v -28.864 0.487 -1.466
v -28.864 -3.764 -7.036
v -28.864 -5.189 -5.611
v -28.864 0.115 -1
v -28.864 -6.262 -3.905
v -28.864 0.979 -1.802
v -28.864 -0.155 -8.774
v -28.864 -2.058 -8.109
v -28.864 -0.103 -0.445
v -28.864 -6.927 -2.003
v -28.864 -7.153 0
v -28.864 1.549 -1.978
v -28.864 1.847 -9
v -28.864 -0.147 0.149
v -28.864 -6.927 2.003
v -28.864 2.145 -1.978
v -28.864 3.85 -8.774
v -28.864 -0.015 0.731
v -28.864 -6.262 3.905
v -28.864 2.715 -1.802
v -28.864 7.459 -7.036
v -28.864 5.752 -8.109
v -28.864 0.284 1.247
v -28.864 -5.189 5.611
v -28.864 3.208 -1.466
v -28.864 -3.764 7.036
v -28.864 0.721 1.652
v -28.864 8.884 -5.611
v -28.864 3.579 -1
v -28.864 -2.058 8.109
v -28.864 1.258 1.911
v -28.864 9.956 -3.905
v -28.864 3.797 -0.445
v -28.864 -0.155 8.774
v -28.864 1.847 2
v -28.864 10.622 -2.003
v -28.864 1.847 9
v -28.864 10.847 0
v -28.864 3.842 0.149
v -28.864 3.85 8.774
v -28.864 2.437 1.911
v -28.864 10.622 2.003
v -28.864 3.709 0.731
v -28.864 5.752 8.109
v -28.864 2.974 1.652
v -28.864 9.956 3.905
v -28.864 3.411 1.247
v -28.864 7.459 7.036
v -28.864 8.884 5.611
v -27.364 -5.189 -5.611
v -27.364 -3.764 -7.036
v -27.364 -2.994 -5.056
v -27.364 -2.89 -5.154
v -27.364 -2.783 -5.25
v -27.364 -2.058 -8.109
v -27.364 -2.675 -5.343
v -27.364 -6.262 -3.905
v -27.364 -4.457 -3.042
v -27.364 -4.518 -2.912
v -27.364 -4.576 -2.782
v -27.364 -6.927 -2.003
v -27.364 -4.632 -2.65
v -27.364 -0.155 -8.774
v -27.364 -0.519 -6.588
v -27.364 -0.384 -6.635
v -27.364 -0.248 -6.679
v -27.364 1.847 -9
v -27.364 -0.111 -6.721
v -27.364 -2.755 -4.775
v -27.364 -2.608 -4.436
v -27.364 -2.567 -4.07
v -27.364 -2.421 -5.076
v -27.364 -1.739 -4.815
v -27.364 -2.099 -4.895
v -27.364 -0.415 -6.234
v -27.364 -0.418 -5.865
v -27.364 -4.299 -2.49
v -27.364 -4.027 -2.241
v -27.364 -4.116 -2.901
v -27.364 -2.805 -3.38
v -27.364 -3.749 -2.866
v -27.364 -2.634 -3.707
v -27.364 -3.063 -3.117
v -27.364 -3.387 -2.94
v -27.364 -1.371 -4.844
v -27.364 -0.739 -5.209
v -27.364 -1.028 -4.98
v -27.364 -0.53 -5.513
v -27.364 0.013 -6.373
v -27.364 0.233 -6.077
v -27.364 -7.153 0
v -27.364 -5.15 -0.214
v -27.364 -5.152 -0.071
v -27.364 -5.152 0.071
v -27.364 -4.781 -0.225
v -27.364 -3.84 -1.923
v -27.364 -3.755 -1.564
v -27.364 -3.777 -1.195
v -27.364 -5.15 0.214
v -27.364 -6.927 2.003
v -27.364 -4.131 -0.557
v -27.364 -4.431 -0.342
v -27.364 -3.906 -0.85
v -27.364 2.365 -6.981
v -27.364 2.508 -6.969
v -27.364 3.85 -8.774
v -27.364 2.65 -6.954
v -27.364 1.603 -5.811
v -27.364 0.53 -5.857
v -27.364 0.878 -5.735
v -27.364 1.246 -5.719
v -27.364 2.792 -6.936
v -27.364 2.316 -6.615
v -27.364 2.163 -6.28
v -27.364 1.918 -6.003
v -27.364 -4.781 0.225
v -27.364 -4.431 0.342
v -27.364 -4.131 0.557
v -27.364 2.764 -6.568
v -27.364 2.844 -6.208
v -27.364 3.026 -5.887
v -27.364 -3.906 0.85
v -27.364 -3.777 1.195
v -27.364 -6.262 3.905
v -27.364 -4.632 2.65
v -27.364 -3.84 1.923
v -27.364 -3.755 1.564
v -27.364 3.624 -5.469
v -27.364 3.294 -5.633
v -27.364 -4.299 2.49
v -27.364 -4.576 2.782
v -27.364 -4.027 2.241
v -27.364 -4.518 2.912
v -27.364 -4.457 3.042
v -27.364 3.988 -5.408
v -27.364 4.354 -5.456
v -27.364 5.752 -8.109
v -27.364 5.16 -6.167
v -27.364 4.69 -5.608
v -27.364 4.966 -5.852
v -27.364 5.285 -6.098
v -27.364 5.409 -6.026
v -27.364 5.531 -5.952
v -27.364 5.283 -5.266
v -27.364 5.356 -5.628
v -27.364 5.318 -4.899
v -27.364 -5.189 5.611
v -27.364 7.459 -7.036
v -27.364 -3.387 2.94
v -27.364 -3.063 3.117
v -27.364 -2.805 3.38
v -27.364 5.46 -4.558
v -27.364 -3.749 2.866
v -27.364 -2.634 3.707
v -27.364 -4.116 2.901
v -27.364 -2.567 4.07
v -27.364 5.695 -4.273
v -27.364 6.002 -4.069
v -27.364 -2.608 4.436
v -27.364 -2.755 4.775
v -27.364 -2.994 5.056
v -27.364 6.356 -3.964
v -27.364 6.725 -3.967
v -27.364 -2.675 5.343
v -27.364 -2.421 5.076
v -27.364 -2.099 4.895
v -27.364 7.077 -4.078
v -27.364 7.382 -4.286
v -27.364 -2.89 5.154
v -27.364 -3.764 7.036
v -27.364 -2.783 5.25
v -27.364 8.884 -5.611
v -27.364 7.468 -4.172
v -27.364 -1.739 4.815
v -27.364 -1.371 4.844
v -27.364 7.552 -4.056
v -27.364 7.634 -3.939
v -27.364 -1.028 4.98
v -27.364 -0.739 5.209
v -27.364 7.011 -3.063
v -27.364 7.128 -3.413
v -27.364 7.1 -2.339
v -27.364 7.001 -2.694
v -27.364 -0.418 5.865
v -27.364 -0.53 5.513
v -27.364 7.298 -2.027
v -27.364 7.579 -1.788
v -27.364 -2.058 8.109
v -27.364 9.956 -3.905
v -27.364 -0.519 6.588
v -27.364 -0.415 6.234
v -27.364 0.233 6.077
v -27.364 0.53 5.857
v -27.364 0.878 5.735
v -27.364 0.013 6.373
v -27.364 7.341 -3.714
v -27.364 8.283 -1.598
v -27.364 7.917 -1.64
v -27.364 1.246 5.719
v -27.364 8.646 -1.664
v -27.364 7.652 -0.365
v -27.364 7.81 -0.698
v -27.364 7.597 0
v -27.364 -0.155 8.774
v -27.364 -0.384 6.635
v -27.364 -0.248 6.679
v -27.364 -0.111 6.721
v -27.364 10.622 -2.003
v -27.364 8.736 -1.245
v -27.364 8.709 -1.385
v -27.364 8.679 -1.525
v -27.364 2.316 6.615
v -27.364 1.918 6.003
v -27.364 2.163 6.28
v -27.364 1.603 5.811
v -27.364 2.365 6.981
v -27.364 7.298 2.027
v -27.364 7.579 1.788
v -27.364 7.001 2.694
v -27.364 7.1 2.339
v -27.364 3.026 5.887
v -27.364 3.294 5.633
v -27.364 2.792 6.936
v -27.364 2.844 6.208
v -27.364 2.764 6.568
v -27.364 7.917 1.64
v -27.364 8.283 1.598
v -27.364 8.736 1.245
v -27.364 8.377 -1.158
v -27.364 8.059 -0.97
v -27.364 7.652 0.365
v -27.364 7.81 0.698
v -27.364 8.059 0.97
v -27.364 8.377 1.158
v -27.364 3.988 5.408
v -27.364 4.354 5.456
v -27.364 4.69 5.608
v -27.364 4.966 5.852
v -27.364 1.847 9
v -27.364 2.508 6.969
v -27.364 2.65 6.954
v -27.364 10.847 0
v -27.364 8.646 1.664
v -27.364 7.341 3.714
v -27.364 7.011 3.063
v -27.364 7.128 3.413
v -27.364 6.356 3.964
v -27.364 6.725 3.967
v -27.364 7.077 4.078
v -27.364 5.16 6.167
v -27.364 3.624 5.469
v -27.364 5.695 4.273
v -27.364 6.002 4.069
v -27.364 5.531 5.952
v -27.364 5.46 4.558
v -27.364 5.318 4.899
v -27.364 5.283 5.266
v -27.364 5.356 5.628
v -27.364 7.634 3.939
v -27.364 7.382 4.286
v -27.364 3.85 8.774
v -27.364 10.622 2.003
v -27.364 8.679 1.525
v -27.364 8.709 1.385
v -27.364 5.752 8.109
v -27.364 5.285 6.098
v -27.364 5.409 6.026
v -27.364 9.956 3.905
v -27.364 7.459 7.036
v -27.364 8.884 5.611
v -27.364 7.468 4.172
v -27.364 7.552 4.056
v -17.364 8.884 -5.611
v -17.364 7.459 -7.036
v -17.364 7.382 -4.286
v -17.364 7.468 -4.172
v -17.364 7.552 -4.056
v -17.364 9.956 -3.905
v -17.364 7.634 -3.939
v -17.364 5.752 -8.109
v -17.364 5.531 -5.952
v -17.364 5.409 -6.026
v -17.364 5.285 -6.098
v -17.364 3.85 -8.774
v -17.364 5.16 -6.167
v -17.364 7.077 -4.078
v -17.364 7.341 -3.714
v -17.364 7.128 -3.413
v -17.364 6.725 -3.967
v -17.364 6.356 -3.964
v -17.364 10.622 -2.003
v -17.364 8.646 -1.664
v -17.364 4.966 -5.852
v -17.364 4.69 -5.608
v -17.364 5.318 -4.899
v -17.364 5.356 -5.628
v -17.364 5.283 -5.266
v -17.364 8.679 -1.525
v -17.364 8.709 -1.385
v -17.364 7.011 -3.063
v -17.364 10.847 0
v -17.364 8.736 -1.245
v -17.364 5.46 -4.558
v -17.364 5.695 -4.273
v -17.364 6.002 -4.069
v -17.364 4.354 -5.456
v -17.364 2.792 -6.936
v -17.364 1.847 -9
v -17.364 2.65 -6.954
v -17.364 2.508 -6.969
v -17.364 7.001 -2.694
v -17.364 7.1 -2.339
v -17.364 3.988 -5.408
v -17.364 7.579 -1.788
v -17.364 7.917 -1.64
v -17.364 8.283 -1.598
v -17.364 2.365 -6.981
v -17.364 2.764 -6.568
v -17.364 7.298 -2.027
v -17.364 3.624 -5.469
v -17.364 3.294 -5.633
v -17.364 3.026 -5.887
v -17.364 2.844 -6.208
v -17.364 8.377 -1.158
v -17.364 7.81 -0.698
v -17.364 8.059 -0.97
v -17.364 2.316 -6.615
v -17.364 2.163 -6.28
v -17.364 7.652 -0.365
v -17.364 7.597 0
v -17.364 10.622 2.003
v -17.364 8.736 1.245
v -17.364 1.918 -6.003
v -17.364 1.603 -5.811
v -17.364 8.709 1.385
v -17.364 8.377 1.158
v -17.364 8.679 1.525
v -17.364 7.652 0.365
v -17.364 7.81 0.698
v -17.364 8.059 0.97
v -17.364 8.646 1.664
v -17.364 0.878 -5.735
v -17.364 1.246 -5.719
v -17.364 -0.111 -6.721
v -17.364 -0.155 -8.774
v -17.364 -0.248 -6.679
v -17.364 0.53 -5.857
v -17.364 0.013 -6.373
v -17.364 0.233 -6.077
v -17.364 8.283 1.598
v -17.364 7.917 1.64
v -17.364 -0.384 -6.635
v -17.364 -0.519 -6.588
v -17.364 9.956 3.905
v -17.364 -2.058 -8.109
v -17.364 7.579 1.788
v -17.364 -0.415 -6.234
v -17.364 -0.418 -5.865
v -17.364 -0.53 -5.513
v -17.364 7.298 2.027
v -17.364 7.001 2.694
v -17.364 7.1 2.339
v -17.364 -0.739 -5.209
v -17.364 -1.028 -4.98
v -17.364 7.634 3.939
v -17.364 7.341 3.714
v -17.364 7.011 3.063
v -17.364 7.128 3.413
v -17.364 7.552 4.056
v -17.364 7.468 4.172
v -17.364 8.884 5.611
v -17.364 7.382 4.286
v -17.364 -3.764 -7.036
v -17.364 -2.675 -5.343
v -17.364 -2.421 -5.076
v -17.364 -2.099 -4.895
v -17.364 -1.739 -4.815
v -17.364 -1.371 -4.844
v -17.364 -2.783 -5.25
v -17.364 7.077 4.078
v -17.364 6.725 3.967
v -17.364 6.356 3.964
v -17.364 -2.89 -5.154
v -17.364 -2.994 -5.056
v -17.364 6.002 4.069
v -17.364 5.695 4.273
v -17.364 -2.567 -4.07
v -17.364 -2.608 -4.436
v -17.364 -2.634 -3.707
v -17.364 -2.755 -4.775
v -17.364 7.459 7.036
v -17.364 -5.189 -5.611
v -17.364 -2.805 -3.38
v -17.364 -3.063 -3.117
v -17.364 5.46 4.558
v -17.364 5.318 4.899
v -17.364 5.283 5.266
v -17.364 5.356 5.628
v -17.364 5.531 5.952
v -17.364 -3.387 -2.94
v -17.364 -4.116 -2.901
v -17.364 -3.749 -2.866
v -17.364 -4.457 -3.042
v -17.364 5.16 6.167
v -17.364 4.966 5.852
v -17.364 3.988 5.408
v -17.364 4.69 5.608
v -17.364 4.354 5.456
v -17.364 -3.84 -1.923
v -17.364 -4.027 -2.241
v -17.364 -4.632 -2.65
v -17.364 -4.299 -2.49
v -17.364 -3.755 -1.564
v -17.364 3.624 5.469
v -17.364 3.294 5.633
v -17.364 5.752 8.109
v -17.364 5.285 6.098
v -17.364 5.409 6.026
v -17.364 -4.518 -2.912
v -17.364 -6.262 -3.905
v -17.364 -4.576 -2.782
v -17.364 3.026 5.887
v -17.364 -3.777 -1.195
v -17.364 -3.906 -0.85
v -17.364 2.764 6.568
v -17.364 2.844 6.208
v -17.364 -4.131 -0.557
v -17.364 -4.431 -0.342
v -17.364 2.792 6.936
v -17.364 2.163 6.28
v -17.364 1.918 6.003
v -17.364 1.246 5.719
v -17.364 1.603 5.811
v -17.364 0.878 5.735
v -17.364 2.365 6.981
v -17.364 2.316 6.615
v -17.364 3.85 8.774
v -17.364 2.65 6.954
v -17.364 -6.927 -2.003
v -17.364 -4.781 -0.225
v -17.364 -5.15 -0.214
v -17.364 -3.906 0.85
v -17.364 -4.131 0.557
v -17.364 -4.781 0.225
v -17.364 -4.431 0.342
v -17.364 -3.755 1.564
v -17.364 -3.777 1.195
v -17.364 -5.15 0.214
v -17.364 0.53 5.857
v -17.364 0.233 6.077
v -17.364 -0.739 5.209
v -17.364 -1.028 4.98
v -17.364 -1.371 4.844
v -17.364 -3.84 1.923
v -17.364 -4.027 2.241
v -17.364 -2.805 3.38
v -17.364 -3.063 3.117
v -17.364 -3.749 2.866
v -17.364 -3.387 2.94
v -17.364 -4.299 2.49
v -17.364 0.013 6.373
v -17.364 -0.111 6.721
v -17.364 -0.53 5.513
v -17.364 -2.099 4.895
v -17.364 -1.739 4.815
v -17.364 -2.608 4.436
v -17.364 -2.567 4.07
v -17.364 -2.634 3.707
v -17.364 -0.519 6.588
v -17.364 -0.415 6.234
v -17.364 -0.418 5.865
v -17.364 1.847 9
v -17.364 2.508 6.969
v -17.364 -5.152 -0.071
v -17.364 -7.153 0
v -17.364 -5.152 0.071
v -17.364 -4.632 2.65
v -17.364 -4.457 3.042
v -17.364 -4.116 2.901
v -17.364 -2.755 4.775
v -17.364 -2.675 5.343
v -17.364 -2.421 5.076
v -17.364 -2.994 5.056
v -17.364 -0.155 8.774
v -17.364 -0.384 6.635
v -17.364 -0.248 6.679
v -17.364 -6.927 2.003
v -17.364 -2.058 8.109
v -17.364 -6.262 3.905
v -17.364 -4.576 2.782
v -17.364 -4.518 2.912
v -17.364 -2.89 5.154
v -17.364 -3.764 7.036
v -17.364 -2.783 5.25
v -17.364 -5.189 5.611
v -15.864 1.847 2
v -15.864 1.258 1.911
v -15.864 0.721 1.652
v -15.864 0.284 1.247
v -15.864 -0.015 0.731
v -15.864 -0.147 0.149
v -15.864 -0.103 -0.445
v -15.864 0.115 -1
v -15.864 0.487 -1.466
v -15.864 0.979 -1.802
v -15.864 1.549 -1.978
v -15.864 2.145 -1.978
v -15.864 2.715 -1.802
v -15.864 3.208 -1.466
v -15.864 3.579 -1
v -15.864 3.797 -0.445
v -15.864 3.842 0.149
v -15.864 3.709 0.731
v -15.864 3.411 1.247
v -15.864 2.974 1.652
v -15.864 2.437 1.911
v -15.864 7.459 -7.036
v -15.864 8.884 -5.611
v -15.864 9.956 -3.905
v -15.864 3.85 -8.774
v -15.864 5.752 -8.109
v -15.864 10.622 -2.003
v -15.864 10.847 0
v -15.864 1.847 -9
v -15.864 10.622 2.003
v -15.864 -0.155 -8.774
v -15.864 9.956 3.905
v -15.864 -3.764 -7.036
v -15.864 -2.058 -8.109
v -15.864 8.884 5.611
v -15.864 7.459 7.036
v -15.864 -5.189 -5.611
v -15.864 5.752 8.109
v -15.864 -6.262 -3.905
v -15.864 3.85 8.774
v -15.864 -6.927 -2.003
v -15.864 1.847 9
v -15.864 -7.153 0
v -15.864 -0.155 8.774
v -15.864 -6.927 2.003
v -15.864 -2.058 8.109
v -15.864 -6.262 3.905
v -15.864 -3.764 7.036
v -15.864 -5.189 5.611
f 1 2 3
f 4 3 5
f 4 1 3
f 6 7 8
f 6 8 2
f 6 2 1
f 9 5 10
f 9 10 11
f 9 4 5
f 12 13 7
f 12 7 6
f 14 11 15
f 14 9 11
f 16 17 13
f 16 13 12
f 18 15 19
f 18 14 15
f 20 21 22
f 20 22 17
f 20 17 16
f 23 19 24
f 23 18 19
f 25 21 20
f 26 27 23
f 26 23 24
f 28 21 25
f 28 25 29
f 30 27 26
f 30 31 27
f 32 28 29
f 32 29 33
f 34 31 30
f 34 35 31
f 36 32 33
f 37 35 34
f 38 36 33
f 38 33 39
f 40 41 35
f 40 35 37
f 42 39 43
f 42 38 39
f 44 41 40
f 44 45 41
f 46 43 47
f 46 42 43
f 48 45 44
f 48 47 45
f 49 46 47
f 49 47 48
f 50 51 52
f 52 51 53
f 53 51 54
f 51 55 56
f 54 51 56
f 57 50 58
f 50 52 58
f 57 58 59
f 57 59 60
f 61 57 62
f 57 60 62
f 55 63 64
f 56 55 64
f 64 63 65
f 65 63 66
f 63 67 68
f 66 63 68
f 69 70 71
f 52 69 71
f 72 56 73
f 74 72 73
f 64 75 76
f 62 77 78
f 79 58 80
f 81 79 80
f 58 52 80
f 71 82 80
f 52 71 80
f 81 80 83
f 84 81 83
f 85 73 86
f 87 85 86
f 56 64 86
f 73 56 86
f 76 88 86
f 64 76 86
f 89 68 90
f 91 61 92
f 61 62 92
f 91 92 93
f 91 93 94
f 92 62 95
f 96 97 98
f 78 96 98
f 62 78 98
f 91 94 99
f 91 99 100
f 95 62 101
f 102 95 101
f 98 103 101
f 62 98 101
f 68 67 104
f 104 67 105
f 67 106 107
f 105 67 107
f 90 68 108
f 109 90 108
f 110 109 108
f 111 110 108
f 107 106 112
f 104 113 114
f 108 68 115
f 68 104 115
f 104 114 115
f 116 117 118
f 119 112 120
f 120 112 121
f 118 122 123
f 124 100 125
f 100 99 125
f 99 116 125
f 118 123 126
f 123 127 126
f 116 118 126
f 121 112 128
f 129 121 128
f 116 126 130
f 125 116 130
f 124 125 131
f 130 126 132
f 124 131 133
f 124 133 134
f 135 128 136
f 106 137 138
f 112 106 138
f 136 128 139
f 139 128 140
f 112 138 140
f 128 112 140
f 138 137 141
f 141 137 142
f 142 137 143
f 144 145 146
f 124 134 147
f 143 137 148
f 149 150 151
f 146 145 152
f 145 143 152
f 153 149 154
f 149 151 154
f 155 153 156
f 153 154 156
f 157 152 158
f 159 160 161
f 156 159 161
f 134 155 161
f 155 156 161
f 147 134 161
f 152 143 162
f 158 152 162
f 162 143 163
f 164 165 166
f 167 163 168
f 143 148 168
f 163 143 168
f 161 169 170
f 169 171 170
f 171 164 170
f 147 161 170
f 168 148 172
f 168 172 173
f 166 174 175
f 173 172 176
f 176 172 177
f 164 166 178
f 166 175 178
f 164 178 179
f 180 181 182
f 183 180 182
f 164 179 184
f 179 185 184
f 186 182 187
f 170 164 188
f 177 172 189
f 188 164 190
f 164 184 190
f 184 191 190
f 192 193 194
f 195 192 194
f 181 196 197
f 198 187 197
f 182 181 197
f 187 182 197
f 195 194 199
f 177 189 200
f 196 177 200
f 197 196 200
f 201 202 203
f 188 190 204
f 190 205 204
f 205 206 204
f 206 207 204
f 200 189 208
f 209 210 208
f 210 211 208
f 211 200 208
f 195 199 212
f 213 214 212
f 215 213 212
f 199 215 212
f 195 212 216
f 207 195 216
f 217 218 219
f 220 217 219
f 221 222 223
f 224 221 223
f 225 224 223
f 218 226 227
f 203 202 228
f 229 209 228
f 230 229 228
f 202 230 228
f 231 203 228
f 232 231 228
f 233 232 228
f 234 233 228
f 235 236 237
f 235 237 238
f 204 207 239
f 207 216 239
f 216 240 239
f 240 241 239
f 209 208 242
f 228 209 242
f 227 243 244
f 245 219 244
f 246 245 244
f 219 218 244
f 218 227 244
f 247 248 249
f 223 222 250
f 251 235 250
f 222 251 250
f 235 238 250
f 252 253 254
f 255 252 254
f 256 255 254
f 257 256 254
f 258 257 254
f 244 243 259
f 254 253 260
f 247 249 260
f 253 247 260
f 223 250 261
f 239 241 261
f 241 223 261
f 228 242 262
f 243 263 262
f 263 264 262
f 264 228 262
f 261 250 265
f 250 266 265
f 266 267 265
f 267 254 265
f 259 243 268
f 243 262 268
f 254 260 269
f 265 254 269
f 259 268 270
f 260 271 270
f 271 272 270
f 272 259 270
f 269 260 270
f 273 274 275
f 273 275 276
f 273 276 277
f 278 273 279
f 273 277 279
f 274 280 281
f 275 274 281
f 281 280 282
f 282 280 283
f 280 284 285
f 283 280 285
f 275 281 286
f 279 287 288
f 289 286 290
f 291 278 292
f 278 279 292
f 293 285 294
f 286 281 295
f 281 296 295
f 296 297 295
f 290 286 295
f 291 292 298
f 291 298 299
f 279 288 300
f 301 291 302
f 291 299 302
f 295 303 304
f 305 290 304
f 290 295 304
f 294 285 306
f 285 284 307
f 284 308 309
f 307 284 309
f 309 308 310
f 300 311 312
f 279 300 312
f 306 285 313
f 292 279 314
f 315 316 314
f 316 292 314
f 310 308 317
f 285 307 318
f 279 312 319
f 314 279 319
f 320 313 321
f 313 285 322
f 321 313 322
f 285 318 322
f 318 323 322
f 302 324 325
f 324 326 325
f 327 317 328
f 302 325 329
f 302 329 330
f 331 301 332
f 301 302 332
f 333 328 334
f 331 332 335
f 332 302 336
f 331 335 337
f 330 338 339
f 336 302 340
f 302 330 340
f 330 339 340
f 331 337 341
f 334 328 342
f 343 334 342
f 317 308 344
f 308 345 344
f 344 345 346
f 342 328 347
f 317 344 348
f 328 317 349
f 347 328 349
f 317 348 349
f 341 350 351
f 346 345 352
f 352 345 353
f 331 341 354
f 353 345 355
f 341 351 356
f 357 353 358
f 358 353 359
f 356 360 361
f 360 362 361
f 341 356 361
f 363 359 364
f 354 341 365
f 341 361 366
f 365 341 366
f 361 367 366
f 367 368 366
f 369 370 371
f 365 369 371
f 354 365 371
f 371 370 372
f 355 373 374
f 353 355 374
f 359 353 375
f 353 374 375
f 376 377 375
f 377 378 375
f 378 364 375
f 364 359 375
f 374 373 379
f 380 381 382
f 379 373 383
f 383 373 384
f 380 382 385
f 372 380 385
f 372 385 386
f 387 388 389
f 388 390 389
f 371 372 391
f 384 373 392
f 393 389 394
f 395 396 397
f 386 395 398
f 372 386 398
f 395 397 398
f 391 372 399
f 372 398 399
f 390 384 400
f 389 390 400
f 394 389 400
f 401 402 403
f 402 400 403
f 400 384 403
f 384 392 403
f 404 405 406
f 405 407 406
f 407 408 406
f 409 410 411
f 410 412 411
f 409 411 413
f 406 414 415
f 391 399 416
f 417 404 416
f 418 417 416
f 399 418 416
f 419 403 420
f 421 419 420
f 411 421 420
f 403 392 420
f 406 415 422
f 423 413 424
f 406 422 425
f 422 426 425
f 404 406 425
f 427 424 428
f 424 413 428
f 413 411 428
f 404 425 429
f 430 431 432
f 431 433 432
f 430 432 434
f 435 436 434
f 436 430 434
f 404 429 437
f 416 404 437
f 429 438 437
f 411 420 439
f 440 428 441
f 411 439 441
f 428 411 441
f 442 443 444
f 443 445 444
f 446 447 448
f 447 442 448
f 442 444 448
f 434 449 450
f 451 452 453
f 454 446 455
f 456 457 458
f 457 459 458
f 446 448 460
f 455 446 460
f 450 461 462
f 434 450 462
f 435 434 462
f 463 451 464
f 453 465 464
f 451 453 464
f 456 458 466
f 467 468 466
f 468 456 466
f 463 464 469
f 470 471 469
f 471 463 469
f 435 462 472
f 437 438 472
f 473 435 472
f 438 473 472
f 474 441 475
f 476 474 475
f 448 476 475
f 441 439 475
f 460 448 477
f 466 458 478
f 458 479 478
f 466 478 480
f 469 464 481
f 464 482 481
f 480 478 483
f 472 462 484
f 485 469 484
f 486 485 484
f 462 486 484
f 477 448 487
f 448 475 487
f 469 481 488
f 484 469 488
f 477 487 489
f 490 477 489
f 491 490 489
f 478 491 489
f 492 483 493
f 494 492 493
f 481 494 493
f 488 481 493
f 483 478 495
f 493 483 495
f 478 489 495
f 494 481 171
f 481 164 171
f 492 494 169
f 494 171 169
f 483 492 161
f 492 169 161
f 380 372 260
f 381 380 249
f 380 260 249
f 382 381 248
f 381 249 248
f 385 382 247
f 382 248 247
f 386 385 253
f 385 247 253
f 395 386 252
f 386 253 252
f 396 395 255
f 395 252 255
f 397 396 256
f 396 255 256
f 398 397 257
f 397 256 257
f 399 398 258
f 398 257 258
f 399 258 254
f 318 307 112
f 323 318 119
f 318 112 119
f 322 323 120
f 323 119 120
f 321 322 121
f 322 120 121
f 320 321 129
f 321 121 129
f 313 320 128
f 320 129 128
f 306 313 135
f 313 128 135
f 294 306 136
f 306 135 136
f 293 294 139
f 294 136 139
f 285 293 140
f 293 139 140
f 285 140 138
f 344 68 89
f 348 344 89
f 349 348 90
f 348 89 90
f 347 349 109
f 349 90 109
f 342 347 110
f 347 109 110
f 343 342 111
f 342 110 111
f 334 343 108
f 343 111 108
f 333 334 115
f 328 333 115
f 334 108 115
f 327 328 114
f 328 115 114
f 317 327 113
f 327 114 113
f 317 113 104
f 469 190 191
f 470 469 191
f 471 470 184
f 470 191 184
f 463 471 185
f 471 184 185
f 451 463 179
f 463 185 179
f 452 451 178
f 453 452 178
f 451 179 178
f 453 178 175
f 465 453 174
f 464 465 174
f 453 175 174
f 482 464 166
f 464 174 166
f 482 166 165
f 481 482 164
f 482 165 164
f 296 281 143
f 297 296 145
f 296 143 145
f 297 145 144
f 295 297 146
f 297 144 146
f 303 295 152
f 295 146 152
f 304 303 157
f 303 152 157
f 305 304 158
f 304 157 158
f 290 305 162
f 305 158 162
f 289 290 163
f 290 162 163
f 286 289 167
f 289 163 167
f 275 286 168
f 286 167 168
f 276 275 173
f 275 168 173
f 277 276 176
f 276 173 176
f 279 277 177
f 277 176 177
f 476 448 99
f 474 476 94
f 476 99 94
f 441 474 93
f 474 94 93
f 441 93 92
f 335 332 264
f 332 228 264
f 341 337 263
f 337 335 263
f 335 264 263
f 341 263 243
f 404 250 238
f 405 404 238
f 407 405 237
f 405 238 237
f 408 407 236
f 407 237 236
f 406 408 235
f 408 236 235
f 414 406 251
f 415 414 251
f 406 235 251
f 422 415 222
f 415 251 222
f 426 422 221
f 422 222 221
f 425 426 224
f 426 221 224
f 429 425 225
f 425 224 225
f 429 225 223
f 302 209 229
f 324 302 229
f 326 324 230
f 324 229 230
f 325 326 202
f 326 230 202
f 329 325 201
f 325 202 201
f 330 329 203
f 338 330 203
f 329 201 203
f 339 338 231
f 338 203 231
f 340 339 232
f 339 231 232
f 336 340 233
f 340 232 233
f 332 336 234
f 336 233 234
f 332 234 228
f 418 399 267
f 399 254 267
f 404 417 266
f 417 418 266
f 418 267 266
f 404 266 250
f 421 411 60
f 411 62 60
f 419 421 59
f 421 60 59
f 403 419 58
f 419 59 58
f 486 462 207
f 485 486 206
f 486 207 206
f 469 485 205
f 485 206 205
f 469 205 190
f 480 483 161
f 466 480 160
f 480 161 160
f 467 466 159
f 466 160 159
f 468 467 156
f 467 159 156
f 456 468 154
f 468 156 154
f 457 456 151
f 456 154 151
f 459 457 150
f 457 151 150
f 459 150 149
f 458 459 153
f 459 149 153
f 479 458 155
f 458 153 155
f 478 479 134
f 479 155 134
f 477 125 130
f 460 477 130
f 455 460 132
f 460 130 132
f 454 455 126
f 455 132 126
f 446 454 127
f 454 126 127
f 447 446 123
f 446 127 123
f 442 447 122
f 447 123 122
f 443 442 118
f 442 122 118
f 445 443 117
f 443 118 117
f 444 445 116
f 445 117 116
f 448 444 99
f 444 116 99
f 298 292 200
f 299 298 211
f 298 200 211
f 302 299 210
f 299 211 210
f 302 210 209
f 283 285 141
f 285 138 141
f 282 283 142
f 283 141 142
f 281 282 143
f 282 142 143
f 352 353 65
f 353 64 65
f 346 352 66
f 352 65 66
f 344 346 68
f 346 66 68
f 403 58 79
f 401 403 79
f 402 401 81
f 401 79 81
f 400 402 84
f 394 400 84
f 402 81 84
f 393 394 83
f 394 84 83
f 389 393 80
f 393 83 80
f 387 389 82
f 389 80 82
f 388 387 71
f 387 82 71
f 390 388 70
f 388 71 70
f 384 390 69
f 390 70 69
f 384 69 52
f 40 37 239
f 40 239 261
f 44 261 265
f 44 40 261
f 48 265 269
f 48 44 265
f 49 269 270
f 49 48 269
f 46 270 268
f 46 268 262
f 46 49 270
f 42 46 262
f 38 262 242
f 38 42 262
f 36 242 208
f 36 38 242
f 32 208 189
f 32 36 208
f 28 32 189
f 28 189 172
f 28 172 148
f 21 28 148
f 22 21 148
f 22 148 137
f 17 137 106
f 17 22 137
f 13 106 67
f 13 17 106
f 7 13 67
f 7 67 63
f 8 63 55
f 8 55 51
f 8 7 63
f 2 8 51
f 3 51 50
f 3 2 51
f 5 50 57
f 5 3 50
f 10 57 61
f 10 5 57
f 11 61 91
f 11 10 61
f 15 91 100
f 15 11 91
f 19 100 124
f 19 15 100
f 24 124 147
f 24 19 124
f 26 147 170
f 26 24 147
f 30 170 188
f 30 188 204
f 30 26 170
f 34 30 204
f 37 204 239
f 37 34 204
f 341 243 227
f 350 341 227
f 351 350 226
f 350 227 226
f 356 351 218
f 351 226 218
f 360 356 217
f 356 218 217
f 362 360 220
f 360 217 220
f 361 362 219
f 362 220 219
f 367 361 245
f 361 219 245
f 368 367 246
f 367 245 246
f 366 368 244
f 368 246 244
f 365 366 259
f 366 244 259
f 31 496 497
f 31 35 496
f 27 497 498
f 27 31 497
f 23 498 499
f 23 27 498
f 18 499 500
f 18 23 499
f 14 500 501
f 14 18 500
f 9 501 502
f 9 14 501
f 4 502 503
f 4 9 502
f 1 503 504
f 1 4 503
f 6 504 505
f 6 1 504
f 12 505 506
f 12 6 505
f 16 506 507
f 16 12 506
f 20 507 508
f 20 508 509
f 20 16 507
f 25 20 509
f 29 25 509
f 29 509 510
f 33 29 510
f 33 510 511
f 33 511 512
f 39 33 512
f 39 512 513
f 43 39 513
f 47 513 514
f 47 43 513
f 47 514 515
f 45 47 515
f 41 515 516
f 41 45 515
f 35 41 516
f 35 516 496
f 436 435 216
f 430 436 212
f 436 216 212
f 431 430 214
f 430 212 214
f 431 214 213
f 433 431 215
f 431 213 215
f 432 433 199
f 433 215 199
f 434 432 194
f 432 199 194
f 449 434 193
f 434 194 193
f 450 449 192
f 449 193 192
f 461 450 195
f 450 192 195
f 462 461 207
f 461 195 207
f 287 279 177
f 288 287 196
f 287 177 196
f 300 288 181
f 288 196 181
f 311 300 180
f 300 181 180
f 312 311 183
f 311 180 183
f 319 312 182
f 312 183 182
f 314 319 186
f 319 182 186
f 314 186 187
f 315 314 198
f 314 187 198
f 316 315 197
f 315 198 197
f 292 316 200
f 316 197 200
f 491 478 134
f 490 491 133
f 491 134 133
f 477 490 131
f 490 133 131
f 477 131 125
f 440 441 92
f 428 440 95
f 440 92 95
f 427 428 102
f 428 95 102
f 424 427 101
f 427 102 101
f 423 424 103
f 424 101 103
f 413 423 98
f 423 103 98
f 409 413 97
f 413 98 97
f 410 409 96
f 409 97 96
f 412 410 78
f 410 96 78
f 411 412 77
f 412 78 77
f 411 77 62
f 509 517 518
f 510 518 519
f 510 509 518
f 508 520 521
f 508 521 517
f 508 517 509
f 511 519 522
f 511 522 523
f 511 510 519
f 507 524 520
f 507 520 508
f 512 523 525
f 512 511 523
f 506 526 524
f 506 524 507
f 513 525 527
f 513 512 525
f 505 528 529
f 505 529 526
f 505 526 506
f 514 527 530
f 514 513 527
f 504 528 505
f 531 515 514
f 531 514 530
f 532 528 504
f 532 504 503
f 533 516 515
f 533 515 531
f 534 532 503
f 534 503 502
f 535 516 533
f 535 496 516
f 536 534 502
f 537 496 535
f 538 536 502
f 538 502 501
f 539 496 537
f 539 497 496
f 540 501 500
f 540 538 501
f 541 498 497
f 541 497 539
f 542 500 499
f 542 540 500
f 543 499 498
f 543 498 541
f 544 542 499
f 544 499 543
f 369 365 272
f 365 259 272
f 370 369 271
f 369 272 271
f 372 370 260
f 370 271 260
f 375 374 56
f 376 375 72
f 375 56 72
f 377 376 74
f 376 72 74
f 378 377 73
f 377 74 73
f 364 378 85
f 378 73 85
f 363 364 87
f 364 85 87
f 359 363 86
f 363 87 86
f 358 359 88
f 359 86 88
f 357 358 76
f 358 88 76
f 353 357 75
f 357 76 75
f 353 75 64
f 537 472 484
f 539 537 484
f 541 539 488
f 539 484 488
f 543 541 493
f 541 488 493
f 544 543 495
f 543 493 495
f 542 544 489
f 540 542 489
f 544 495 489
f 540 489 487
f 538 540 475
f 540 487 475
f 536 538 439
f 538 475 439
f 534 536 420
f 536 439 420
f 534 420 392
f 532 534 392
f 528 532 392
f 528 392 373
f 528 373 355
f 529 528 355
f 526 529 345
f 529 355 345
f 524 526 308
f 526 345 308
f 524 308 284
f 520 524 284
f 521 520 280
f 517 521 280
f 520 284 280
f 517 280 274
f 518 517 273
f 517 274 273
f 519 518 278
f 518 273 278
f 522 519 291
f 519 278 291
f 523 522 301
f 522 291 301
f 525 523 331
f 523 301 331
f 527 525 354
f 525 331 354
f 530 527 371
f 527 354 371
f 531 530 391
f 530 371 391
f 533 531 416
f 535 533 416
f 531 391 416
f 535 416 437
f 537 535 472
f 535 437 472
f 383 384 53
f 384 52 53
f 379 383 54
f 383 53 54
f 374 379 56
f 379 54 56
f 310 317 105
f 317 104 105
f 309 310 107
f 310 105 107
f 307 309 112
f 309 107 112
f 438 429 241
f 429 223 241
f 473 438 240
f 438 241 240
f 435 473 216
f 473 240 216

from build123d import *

# Parameters (mm, degrees)
SKETCH_3_R               = 2
CUT_EXTRUDE_2_DEPTH      = 17
SKETCH_4_W               = 2.5
SKETCH_4_H               = 2.683329606
CUT_EXTRUDE_3_DEPTH      = 17
PATTERN_CIRCULAR_1_COUNT = 15
EXTRUDE_START            = 1.5
SKETCH_5_R               = 9
SKETCH_5_R_2             = 2
EXTRUDE_1_DEPTH          = 1.5
SKETCH_6_R               = 9
SKETCH_6_R_2             = 2
EXTRUDE_2_DEPTH          = 1.5


with BuildPart() as part:
    # 草图1 → 旋转2 (revolve)
    with BuildSketch(Plane.XY, mode=Mode.PRIVATE) as revolve_2_sk:
        Polygon((-27.363734917, 8.847191366), (-27.363734917, 3.847191366), (-28.613734917, 3.847191366), (-28.613734917, 1.847191366), (-16.113734917, 1.847191366), (-16.113734917, 3.847191366), (-17.363734917, 3.847191366), (-17.363734917, 8.847191366), align=None)
    revolve(revolve_2_sk.sketch.rotate(Axis((-48.964491856, 1.847191366, 0), (1, 0, 0)), 90), axis=Axis((-48.964491856, 1.847191366, 0), (1, 0, 0)))

    # 草图3 → 切除-拉伸2 (cut)
    with BuildSketch(Plane.ZY.offset(28.613734917)):
        with Locations((0, 1.847191366)):
            Circle(SKETCH_3_R)
    extrude(amount=-CUT_EXTRUDE_2_DEPTH, mode=Mode.SUBTRACT)

    # 草图4 → 切除-拉伸3 (cut)
    with BuildSketch(Plane.ZY.offset(27.363734917)):
        with Locations((0, 10.188856169)):
            Rectangle(SKETCH_4_W, SKETCH_4_H)
        with BuildLine():
            Line((1.25, 8.847191366), (-1.25, 8.847191366))
            ThreePointArc((-1.25, 8.847191366), (0, 7.597191366), (1.25, 8.847191366))
        make_face()
    cut_extrude_3 = extrude(amount=-CUT_EXTRUDE_3_DEPTH, mode=Mode.SUBTRACT)

    # 阵列(圆周)1: 切除-拉伸3 ×15 about axis
    pattern_circular_1_axis = Axis((0, 1.847191366, 0), (1, 0, 0))
    for i in range(1, PATTERN_CIRCULAR_1_COUNT):
        add(cut_extrude_3.rotate(pattern_circular_1_axis, i * 360 / PATTERN_CIRCULAR_1_COUNT), mode=Mode.SUBTRACT)

    # 草图5 → 凸台-拉伸1 (add)
    with BuildSketch(Plane.ZY.offset(27.363734917).offset(EXTRUDE_START)):
        with Locations((0, 1.847191366)):
            Circle(SKETCH_5_R)
        with Locations((0, 1.847191366)):
            Circle(SKETCH_5_R_2, mode=Mode.SUBTRACT)
    extrude(amount=-EXTRUDE_1_DEPTH)

    # 草图6 → 凸台-拉伸2 (add)
    with BuildSketch(Plane(origin=(-17.363734917, 0, 0), x_dir=(0, 0, -1), z_dir=(1, 0, 0))):
        with Locations(Location((0, 1.847191366, 0), (0, 0, 180))):
            Circle(SKETCH_6_R)
        with Locations(Location((0, 1.847191366, 0), (0, 0, 180))):
            Circle(SKETCH_6_R_2, mode=Mode.SUBTRACT)
    extrude(amount=EXTRUDE_2_DEPTH)


solid = part.part
